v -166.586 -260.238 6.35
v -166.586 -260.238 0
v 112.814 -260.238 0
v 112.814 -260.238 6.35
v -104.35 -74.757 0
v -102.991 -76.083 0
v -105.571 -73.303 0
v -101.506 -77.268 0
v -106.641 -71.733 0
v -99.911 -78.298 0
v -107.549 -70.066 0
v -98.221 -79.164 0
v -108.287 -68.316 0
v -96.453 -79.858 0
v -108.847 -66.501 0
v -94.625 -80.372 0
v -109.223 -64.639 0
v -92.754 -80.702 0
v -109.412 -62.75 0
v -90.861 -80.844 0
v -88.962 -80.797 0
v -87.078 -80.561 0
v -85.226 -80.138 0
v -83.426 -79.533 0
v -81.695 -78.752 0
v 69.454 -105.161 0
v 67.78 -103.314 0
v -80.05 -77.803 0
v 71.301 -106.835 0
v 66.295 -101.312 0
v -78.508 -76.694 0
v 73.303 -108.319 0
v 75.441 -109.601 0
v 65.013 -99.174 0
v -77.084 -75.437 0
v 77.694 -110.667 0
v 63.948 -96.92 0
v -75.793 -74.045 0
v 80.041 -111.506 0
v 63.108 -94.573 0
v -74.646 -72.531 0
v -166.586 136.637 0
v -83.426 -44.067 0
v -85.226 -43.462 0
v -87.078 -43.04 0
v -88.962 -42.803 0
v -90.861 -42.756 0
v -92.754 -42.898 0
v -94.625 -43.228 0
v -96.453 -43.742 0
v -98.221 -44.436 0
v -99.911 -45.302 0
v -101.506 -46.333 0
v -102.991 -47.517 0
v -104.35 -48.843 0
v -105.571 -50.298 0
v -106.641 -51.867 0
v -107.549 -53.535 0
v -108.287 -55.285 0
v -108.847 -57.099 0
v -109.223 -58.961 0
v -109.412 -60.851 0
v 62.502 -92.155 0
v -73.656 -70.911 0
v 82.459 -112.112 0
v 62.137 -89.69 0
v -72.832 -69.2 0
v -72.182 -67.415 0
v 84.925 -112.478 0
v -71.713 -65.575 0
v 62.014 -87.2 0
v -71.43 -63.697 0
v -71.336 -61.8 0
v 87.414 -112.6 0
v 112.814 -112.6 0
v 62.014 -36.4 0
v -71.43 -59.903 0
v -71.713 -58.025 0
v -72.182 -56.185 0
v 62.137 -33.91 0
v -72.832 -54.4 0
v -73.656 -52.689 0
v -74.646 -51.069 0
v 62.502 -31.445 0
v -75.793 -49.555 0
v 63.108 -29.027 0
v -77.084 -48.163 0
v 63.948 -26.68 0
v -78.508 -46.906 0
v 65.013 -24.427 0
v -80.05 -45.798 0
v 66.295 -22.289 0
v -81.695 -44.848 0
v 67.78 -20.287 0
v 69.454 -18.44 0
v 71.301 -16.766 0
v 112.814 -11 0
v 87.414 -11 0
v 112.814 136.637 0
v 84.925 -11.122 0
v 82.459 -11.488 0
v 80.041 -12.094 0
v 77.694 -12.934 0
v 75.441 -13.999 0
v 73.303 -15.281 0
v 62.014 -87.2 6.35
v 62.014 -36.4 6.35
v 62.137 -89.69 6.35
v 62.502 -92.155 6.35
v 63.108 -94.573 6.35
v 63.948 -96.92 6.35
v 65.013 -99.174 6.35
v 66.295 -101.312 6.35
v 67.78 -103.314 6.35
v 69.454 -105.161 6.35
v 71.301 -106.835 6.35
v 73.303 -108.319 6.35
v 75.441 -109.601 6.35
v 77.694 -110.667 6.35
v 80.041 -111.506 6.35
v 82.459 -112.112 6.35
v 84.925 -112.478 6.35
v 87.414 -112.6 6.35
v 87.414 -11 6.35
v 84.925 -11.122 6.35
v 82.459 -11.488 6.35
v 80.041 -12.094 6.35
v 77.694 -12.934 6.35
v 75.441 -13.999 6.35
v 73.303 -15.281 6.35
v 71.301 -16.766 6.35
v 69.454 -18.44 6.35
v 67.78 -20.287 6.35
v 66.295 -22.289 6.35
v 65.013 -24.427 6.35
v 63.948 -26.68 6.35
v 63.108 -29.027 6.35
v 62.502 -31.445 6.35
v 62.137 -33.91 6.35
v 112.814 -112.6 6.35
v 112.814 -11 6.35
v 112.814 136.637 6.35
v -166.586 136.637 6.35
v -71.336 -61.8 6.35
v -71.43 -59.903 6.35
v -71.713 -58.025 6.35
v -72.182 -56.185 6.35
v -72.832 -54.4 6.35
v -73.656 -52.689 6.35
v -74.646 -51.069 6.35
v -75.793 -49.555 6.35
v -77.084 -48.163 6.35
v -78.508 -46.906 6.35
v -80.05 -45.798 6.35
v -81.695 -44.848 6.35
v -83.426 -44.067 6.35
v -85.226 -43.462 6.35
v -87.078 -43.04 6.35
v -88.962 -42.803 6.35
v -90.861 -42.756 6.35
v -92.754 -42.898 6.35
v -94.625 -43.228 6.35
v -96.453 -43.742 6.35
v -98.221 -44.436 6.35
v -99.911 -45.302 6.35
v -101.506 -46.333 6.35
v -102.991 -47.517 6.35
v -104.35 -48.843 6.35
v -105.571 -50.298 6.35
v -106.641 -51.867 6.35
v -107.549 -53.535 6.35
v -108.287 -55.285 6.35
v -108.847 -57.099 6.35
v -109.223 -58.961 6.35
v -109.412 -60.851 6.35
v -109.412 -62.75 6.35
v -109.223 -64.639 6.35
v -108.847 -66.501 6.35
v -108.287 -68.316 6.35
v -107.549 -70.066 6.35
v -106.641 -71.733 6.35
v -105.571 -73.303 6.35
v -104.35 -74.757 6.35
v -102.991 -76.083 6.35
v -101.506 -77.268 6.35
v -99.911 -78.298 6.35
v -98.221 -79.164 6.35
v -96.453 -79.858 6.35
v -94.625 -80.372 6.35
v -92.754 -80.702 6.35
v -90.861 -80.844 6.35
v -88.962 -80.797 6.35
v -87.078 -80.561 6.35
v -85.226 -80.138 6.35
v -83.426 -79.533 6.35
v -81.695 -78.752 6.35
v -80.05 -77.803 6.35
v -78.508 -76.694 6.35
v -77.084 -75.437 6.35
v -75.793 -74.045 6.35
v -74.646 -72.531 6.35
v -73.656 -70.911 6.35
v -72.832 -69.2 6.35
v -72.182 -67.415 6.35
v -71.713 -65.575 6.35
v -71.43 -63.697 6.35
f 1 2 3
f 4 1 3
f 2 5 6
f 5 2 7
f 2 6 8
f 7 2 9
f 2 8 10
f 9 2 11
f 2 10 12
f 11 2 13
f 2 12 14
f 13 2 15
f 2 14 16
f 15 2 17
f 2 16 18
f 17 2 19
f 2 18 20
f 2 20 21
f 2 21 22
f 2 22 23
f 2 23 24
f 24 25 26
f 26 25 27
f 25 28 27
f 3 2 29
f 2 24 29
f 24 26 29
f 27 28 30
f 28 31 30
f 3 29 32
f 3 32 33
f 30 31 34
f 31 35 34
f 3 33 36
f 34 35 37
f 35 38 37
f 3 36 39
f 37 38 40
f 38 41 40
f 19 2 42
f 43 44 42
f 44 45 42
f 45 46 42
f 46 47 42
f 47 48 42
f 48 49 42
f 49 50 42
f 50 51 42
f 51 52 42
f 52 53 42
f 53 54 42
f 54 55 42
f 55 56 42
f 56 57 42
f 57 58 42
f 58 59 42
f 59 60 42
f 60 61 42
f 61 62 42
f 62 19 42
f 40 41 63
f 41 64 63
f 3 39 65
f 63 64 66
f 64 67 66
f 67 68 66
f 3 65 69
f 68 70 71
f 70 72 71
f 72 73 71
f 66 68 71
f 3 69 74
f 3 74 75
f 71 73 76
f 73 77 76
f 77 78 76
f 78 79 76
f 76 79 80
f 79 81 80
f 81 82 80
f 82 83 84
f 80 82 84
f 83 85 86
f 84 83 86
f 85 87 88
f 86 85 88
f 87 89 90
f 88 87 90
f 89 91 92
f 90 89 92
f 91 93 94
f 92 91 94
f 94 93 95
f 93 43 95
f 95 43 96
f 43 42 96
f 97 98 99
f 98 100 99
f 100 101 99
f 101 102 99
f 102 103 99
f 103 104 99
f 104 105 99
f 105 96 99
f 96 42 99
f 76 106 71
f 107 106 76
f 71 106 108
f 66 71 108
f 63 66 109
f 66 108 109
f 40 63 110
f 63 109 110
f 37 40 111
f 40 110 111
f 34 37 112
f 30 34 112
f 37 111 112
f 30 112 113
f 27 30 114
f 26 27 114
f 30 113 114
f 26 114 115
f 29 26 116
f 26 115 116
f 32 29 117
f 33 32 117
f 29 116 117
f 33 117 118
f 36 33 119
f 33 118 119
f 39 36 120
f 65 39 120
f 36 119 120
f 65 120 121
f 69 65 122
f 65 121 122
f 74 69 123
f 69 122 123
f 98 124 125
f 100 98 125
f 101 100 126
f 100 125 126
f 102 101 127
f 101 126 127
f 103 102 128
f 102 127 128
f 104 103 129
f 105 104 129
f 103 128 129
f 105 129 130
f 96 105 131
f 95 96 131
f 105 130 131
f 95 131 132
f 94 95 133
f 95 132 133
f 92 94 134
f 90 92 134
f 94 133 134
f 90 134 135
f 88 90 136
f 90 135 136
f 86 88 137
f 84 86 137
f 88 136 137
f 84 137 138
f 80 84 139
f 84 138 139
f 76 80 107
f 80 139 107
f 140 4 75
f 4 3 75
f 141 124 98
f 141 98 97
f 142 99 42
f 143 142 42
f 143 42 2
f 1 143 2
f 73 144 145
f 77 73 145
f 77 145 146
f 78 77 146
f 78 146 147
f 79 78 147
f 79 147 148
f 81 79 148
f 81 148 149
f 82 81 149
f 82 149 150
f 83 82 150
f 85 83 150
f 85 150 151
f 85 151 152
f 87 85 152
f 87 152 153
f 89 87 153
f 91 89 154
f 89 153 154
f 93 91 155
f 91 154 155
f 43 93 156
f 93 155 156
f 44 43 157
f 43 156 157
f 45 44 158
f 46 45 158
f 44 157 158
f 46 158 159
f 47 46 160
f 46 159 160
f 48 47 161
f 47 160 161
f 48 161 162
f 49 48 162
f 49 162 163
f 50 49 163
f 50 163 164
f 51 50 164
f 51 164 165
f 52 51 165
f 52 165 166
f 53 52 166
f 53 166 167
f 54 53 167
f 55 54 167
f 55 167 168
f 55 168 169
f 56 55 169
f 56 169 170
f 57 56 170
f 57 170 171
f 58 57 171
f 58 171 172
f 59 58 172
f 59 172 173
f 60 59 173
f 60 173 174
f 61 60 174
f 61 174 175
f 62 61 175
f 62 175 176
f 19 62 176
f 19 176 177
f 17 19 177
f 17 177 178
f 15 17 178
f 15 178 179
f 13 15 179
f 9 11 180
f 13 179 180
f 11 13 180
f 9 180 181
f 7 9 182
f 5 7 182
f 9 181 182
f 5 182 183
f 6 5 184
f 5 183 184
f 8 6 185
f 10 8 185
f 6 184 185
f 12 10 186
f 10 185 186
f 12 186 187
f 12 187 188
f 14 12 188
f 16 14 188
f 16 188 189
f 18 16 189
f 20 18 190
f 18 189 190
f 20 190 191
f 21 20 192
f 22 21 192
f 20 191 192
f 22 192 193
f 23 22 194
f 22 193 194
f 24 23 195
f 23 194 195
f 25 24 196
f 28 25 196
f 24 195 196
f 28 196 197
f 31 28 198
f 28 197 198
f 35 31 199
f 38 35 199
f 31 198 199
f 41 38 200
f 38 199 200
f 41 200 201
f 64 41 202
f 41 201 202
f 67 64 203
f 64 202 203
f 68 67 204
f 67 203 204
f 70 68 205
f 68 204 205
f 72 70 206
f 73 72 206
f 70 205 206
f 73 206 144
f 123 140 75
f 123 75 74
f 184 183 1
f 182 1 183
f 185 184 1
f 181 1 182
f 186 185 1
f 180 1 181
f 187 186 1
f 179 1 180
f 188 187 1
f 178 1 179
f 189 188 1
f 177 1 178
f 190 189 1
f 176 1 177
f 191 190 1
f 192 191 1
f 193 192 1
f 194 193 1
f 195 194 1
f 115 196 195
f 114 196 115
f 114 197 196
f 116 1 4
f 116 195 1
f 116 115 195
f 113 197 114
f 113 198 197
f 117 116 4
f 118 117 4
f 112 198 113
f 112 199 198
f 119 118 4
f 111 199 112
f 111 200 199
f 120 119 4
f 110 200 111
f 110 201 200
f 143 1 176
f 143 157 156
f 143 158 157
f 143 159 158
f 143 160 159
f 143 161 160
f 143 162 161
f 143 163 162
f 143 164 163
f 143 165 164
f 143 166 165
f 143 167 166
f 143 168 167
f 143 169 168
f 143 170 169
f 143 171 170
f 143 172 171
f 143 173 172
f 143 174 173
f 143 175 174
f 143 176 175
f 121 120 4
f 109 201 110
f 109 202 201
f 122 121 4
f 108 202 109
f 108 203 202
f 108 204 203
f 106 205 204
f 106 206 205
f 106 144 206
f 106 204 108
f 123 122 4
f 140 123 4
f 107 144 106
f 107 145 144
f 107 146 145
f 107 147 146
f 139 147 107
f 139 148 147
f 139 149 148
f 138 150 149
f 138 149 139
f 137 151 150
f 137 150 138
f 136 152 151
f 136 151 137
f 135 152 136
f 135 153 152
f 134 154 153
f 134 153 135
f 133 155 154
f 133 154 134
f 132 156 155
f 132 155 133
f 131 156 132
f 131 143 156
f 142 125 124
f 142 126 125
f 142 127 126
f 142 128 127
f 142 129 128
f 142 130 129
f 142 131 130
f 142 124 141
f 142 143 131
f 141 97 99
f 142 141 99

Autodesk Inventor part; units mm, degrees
ref_plane "YZ Plane" through (0, 0, 0) normal (1, 0, 0) x (0, 1, 0)
ref_plane "XZ Plane" through (0, 0, 0) normal (0, 1, 0) x (-1, 0, 0)
ref_plane "XY Plane" through (0, 0, 0) normal (0, 0, 1) x (1, 0, 0)
sketch "Sketch1" plane through (0, 0, 0) normal (0, 0, 1) x (1, 0, 0)
  line L0 (-166.5857, -260.2376) -> (112.8143, -260.2376)
  line L1 (112.8143, -260.2376) -> (112.8143, 136.6374)
  line L2 (112.8143, 136.6374) -> (-166.5857, 136.6374)
  line L3 (-166.5857, 136.6374) -> (-166.5857, -260.2376)
  point P0 (0, 0)
  dimension "d0" = 396.875
  dimension "d3" = 279.4
extrude "Board" add sketch "Sketch1" along normal blind 6.35
sketch "Sketch2" plane through (0, 0, 6.35) normal (0, 0, 1) x (1, 0, 0)
  circle A0 centre (-90.3857, -61.8001) radius 19.05
  line L0 (-166.5857, -260.2376) -> (112.8143, -260.2376) projected
  line L1 (-166.5857, 136.6374) -> (-166.5857, -260.2376) projected
  line L2 (112.8143, -260.2376) -> (112.8143, 136.6374) projected
  line L3 (112.8143, -112.6001) -> (87.4143, -112.6001)
  line L4 (62.0143, -87.2001) -> (62.0143, -36.4001)
  line L5 (87.4143, -11.0001) -> (112.8143, -11.0001)
  line L6 (112.8143, -11.0001) -> (112.8143, -112.6001)
  arc A1 (62.0143, -87.2001) -> (87.4143, -112.6001) centre (87.4143, -87.2001) ccw
  arc A2 (87.4143, -11.0001) -> (62.0143, -36.4001) centre (87.4143, -36.4001) ccw
  line L7 (112.8143, 136.6374) -> (-166.5857, 136.6374) projected
  point P0 (0, 0)
  point P1 (62.0143, -11.0001)
  dimension "d4" = 38.1
  dimension "d5" = 198.4375
  dimension "d6" = 76.2
  dimension "d9" = 50.8
  dimension "d10" = 25.4
  dimension "d11" = 101.6
  dimension "d12" = 25.4
  dimension "d13" = 147.6375
extrude "Cutout Holes" cut sketch "Sketch2" against normal blind 6.35 contours A0 | L3 A1 L4 A2 L5 L2
equation "\"d5\" = 0.5 * d0"
equation "\"d13\" = -0.5 * d11 + 0.5 * d0"
properties part number "Back Panel Bottom"
